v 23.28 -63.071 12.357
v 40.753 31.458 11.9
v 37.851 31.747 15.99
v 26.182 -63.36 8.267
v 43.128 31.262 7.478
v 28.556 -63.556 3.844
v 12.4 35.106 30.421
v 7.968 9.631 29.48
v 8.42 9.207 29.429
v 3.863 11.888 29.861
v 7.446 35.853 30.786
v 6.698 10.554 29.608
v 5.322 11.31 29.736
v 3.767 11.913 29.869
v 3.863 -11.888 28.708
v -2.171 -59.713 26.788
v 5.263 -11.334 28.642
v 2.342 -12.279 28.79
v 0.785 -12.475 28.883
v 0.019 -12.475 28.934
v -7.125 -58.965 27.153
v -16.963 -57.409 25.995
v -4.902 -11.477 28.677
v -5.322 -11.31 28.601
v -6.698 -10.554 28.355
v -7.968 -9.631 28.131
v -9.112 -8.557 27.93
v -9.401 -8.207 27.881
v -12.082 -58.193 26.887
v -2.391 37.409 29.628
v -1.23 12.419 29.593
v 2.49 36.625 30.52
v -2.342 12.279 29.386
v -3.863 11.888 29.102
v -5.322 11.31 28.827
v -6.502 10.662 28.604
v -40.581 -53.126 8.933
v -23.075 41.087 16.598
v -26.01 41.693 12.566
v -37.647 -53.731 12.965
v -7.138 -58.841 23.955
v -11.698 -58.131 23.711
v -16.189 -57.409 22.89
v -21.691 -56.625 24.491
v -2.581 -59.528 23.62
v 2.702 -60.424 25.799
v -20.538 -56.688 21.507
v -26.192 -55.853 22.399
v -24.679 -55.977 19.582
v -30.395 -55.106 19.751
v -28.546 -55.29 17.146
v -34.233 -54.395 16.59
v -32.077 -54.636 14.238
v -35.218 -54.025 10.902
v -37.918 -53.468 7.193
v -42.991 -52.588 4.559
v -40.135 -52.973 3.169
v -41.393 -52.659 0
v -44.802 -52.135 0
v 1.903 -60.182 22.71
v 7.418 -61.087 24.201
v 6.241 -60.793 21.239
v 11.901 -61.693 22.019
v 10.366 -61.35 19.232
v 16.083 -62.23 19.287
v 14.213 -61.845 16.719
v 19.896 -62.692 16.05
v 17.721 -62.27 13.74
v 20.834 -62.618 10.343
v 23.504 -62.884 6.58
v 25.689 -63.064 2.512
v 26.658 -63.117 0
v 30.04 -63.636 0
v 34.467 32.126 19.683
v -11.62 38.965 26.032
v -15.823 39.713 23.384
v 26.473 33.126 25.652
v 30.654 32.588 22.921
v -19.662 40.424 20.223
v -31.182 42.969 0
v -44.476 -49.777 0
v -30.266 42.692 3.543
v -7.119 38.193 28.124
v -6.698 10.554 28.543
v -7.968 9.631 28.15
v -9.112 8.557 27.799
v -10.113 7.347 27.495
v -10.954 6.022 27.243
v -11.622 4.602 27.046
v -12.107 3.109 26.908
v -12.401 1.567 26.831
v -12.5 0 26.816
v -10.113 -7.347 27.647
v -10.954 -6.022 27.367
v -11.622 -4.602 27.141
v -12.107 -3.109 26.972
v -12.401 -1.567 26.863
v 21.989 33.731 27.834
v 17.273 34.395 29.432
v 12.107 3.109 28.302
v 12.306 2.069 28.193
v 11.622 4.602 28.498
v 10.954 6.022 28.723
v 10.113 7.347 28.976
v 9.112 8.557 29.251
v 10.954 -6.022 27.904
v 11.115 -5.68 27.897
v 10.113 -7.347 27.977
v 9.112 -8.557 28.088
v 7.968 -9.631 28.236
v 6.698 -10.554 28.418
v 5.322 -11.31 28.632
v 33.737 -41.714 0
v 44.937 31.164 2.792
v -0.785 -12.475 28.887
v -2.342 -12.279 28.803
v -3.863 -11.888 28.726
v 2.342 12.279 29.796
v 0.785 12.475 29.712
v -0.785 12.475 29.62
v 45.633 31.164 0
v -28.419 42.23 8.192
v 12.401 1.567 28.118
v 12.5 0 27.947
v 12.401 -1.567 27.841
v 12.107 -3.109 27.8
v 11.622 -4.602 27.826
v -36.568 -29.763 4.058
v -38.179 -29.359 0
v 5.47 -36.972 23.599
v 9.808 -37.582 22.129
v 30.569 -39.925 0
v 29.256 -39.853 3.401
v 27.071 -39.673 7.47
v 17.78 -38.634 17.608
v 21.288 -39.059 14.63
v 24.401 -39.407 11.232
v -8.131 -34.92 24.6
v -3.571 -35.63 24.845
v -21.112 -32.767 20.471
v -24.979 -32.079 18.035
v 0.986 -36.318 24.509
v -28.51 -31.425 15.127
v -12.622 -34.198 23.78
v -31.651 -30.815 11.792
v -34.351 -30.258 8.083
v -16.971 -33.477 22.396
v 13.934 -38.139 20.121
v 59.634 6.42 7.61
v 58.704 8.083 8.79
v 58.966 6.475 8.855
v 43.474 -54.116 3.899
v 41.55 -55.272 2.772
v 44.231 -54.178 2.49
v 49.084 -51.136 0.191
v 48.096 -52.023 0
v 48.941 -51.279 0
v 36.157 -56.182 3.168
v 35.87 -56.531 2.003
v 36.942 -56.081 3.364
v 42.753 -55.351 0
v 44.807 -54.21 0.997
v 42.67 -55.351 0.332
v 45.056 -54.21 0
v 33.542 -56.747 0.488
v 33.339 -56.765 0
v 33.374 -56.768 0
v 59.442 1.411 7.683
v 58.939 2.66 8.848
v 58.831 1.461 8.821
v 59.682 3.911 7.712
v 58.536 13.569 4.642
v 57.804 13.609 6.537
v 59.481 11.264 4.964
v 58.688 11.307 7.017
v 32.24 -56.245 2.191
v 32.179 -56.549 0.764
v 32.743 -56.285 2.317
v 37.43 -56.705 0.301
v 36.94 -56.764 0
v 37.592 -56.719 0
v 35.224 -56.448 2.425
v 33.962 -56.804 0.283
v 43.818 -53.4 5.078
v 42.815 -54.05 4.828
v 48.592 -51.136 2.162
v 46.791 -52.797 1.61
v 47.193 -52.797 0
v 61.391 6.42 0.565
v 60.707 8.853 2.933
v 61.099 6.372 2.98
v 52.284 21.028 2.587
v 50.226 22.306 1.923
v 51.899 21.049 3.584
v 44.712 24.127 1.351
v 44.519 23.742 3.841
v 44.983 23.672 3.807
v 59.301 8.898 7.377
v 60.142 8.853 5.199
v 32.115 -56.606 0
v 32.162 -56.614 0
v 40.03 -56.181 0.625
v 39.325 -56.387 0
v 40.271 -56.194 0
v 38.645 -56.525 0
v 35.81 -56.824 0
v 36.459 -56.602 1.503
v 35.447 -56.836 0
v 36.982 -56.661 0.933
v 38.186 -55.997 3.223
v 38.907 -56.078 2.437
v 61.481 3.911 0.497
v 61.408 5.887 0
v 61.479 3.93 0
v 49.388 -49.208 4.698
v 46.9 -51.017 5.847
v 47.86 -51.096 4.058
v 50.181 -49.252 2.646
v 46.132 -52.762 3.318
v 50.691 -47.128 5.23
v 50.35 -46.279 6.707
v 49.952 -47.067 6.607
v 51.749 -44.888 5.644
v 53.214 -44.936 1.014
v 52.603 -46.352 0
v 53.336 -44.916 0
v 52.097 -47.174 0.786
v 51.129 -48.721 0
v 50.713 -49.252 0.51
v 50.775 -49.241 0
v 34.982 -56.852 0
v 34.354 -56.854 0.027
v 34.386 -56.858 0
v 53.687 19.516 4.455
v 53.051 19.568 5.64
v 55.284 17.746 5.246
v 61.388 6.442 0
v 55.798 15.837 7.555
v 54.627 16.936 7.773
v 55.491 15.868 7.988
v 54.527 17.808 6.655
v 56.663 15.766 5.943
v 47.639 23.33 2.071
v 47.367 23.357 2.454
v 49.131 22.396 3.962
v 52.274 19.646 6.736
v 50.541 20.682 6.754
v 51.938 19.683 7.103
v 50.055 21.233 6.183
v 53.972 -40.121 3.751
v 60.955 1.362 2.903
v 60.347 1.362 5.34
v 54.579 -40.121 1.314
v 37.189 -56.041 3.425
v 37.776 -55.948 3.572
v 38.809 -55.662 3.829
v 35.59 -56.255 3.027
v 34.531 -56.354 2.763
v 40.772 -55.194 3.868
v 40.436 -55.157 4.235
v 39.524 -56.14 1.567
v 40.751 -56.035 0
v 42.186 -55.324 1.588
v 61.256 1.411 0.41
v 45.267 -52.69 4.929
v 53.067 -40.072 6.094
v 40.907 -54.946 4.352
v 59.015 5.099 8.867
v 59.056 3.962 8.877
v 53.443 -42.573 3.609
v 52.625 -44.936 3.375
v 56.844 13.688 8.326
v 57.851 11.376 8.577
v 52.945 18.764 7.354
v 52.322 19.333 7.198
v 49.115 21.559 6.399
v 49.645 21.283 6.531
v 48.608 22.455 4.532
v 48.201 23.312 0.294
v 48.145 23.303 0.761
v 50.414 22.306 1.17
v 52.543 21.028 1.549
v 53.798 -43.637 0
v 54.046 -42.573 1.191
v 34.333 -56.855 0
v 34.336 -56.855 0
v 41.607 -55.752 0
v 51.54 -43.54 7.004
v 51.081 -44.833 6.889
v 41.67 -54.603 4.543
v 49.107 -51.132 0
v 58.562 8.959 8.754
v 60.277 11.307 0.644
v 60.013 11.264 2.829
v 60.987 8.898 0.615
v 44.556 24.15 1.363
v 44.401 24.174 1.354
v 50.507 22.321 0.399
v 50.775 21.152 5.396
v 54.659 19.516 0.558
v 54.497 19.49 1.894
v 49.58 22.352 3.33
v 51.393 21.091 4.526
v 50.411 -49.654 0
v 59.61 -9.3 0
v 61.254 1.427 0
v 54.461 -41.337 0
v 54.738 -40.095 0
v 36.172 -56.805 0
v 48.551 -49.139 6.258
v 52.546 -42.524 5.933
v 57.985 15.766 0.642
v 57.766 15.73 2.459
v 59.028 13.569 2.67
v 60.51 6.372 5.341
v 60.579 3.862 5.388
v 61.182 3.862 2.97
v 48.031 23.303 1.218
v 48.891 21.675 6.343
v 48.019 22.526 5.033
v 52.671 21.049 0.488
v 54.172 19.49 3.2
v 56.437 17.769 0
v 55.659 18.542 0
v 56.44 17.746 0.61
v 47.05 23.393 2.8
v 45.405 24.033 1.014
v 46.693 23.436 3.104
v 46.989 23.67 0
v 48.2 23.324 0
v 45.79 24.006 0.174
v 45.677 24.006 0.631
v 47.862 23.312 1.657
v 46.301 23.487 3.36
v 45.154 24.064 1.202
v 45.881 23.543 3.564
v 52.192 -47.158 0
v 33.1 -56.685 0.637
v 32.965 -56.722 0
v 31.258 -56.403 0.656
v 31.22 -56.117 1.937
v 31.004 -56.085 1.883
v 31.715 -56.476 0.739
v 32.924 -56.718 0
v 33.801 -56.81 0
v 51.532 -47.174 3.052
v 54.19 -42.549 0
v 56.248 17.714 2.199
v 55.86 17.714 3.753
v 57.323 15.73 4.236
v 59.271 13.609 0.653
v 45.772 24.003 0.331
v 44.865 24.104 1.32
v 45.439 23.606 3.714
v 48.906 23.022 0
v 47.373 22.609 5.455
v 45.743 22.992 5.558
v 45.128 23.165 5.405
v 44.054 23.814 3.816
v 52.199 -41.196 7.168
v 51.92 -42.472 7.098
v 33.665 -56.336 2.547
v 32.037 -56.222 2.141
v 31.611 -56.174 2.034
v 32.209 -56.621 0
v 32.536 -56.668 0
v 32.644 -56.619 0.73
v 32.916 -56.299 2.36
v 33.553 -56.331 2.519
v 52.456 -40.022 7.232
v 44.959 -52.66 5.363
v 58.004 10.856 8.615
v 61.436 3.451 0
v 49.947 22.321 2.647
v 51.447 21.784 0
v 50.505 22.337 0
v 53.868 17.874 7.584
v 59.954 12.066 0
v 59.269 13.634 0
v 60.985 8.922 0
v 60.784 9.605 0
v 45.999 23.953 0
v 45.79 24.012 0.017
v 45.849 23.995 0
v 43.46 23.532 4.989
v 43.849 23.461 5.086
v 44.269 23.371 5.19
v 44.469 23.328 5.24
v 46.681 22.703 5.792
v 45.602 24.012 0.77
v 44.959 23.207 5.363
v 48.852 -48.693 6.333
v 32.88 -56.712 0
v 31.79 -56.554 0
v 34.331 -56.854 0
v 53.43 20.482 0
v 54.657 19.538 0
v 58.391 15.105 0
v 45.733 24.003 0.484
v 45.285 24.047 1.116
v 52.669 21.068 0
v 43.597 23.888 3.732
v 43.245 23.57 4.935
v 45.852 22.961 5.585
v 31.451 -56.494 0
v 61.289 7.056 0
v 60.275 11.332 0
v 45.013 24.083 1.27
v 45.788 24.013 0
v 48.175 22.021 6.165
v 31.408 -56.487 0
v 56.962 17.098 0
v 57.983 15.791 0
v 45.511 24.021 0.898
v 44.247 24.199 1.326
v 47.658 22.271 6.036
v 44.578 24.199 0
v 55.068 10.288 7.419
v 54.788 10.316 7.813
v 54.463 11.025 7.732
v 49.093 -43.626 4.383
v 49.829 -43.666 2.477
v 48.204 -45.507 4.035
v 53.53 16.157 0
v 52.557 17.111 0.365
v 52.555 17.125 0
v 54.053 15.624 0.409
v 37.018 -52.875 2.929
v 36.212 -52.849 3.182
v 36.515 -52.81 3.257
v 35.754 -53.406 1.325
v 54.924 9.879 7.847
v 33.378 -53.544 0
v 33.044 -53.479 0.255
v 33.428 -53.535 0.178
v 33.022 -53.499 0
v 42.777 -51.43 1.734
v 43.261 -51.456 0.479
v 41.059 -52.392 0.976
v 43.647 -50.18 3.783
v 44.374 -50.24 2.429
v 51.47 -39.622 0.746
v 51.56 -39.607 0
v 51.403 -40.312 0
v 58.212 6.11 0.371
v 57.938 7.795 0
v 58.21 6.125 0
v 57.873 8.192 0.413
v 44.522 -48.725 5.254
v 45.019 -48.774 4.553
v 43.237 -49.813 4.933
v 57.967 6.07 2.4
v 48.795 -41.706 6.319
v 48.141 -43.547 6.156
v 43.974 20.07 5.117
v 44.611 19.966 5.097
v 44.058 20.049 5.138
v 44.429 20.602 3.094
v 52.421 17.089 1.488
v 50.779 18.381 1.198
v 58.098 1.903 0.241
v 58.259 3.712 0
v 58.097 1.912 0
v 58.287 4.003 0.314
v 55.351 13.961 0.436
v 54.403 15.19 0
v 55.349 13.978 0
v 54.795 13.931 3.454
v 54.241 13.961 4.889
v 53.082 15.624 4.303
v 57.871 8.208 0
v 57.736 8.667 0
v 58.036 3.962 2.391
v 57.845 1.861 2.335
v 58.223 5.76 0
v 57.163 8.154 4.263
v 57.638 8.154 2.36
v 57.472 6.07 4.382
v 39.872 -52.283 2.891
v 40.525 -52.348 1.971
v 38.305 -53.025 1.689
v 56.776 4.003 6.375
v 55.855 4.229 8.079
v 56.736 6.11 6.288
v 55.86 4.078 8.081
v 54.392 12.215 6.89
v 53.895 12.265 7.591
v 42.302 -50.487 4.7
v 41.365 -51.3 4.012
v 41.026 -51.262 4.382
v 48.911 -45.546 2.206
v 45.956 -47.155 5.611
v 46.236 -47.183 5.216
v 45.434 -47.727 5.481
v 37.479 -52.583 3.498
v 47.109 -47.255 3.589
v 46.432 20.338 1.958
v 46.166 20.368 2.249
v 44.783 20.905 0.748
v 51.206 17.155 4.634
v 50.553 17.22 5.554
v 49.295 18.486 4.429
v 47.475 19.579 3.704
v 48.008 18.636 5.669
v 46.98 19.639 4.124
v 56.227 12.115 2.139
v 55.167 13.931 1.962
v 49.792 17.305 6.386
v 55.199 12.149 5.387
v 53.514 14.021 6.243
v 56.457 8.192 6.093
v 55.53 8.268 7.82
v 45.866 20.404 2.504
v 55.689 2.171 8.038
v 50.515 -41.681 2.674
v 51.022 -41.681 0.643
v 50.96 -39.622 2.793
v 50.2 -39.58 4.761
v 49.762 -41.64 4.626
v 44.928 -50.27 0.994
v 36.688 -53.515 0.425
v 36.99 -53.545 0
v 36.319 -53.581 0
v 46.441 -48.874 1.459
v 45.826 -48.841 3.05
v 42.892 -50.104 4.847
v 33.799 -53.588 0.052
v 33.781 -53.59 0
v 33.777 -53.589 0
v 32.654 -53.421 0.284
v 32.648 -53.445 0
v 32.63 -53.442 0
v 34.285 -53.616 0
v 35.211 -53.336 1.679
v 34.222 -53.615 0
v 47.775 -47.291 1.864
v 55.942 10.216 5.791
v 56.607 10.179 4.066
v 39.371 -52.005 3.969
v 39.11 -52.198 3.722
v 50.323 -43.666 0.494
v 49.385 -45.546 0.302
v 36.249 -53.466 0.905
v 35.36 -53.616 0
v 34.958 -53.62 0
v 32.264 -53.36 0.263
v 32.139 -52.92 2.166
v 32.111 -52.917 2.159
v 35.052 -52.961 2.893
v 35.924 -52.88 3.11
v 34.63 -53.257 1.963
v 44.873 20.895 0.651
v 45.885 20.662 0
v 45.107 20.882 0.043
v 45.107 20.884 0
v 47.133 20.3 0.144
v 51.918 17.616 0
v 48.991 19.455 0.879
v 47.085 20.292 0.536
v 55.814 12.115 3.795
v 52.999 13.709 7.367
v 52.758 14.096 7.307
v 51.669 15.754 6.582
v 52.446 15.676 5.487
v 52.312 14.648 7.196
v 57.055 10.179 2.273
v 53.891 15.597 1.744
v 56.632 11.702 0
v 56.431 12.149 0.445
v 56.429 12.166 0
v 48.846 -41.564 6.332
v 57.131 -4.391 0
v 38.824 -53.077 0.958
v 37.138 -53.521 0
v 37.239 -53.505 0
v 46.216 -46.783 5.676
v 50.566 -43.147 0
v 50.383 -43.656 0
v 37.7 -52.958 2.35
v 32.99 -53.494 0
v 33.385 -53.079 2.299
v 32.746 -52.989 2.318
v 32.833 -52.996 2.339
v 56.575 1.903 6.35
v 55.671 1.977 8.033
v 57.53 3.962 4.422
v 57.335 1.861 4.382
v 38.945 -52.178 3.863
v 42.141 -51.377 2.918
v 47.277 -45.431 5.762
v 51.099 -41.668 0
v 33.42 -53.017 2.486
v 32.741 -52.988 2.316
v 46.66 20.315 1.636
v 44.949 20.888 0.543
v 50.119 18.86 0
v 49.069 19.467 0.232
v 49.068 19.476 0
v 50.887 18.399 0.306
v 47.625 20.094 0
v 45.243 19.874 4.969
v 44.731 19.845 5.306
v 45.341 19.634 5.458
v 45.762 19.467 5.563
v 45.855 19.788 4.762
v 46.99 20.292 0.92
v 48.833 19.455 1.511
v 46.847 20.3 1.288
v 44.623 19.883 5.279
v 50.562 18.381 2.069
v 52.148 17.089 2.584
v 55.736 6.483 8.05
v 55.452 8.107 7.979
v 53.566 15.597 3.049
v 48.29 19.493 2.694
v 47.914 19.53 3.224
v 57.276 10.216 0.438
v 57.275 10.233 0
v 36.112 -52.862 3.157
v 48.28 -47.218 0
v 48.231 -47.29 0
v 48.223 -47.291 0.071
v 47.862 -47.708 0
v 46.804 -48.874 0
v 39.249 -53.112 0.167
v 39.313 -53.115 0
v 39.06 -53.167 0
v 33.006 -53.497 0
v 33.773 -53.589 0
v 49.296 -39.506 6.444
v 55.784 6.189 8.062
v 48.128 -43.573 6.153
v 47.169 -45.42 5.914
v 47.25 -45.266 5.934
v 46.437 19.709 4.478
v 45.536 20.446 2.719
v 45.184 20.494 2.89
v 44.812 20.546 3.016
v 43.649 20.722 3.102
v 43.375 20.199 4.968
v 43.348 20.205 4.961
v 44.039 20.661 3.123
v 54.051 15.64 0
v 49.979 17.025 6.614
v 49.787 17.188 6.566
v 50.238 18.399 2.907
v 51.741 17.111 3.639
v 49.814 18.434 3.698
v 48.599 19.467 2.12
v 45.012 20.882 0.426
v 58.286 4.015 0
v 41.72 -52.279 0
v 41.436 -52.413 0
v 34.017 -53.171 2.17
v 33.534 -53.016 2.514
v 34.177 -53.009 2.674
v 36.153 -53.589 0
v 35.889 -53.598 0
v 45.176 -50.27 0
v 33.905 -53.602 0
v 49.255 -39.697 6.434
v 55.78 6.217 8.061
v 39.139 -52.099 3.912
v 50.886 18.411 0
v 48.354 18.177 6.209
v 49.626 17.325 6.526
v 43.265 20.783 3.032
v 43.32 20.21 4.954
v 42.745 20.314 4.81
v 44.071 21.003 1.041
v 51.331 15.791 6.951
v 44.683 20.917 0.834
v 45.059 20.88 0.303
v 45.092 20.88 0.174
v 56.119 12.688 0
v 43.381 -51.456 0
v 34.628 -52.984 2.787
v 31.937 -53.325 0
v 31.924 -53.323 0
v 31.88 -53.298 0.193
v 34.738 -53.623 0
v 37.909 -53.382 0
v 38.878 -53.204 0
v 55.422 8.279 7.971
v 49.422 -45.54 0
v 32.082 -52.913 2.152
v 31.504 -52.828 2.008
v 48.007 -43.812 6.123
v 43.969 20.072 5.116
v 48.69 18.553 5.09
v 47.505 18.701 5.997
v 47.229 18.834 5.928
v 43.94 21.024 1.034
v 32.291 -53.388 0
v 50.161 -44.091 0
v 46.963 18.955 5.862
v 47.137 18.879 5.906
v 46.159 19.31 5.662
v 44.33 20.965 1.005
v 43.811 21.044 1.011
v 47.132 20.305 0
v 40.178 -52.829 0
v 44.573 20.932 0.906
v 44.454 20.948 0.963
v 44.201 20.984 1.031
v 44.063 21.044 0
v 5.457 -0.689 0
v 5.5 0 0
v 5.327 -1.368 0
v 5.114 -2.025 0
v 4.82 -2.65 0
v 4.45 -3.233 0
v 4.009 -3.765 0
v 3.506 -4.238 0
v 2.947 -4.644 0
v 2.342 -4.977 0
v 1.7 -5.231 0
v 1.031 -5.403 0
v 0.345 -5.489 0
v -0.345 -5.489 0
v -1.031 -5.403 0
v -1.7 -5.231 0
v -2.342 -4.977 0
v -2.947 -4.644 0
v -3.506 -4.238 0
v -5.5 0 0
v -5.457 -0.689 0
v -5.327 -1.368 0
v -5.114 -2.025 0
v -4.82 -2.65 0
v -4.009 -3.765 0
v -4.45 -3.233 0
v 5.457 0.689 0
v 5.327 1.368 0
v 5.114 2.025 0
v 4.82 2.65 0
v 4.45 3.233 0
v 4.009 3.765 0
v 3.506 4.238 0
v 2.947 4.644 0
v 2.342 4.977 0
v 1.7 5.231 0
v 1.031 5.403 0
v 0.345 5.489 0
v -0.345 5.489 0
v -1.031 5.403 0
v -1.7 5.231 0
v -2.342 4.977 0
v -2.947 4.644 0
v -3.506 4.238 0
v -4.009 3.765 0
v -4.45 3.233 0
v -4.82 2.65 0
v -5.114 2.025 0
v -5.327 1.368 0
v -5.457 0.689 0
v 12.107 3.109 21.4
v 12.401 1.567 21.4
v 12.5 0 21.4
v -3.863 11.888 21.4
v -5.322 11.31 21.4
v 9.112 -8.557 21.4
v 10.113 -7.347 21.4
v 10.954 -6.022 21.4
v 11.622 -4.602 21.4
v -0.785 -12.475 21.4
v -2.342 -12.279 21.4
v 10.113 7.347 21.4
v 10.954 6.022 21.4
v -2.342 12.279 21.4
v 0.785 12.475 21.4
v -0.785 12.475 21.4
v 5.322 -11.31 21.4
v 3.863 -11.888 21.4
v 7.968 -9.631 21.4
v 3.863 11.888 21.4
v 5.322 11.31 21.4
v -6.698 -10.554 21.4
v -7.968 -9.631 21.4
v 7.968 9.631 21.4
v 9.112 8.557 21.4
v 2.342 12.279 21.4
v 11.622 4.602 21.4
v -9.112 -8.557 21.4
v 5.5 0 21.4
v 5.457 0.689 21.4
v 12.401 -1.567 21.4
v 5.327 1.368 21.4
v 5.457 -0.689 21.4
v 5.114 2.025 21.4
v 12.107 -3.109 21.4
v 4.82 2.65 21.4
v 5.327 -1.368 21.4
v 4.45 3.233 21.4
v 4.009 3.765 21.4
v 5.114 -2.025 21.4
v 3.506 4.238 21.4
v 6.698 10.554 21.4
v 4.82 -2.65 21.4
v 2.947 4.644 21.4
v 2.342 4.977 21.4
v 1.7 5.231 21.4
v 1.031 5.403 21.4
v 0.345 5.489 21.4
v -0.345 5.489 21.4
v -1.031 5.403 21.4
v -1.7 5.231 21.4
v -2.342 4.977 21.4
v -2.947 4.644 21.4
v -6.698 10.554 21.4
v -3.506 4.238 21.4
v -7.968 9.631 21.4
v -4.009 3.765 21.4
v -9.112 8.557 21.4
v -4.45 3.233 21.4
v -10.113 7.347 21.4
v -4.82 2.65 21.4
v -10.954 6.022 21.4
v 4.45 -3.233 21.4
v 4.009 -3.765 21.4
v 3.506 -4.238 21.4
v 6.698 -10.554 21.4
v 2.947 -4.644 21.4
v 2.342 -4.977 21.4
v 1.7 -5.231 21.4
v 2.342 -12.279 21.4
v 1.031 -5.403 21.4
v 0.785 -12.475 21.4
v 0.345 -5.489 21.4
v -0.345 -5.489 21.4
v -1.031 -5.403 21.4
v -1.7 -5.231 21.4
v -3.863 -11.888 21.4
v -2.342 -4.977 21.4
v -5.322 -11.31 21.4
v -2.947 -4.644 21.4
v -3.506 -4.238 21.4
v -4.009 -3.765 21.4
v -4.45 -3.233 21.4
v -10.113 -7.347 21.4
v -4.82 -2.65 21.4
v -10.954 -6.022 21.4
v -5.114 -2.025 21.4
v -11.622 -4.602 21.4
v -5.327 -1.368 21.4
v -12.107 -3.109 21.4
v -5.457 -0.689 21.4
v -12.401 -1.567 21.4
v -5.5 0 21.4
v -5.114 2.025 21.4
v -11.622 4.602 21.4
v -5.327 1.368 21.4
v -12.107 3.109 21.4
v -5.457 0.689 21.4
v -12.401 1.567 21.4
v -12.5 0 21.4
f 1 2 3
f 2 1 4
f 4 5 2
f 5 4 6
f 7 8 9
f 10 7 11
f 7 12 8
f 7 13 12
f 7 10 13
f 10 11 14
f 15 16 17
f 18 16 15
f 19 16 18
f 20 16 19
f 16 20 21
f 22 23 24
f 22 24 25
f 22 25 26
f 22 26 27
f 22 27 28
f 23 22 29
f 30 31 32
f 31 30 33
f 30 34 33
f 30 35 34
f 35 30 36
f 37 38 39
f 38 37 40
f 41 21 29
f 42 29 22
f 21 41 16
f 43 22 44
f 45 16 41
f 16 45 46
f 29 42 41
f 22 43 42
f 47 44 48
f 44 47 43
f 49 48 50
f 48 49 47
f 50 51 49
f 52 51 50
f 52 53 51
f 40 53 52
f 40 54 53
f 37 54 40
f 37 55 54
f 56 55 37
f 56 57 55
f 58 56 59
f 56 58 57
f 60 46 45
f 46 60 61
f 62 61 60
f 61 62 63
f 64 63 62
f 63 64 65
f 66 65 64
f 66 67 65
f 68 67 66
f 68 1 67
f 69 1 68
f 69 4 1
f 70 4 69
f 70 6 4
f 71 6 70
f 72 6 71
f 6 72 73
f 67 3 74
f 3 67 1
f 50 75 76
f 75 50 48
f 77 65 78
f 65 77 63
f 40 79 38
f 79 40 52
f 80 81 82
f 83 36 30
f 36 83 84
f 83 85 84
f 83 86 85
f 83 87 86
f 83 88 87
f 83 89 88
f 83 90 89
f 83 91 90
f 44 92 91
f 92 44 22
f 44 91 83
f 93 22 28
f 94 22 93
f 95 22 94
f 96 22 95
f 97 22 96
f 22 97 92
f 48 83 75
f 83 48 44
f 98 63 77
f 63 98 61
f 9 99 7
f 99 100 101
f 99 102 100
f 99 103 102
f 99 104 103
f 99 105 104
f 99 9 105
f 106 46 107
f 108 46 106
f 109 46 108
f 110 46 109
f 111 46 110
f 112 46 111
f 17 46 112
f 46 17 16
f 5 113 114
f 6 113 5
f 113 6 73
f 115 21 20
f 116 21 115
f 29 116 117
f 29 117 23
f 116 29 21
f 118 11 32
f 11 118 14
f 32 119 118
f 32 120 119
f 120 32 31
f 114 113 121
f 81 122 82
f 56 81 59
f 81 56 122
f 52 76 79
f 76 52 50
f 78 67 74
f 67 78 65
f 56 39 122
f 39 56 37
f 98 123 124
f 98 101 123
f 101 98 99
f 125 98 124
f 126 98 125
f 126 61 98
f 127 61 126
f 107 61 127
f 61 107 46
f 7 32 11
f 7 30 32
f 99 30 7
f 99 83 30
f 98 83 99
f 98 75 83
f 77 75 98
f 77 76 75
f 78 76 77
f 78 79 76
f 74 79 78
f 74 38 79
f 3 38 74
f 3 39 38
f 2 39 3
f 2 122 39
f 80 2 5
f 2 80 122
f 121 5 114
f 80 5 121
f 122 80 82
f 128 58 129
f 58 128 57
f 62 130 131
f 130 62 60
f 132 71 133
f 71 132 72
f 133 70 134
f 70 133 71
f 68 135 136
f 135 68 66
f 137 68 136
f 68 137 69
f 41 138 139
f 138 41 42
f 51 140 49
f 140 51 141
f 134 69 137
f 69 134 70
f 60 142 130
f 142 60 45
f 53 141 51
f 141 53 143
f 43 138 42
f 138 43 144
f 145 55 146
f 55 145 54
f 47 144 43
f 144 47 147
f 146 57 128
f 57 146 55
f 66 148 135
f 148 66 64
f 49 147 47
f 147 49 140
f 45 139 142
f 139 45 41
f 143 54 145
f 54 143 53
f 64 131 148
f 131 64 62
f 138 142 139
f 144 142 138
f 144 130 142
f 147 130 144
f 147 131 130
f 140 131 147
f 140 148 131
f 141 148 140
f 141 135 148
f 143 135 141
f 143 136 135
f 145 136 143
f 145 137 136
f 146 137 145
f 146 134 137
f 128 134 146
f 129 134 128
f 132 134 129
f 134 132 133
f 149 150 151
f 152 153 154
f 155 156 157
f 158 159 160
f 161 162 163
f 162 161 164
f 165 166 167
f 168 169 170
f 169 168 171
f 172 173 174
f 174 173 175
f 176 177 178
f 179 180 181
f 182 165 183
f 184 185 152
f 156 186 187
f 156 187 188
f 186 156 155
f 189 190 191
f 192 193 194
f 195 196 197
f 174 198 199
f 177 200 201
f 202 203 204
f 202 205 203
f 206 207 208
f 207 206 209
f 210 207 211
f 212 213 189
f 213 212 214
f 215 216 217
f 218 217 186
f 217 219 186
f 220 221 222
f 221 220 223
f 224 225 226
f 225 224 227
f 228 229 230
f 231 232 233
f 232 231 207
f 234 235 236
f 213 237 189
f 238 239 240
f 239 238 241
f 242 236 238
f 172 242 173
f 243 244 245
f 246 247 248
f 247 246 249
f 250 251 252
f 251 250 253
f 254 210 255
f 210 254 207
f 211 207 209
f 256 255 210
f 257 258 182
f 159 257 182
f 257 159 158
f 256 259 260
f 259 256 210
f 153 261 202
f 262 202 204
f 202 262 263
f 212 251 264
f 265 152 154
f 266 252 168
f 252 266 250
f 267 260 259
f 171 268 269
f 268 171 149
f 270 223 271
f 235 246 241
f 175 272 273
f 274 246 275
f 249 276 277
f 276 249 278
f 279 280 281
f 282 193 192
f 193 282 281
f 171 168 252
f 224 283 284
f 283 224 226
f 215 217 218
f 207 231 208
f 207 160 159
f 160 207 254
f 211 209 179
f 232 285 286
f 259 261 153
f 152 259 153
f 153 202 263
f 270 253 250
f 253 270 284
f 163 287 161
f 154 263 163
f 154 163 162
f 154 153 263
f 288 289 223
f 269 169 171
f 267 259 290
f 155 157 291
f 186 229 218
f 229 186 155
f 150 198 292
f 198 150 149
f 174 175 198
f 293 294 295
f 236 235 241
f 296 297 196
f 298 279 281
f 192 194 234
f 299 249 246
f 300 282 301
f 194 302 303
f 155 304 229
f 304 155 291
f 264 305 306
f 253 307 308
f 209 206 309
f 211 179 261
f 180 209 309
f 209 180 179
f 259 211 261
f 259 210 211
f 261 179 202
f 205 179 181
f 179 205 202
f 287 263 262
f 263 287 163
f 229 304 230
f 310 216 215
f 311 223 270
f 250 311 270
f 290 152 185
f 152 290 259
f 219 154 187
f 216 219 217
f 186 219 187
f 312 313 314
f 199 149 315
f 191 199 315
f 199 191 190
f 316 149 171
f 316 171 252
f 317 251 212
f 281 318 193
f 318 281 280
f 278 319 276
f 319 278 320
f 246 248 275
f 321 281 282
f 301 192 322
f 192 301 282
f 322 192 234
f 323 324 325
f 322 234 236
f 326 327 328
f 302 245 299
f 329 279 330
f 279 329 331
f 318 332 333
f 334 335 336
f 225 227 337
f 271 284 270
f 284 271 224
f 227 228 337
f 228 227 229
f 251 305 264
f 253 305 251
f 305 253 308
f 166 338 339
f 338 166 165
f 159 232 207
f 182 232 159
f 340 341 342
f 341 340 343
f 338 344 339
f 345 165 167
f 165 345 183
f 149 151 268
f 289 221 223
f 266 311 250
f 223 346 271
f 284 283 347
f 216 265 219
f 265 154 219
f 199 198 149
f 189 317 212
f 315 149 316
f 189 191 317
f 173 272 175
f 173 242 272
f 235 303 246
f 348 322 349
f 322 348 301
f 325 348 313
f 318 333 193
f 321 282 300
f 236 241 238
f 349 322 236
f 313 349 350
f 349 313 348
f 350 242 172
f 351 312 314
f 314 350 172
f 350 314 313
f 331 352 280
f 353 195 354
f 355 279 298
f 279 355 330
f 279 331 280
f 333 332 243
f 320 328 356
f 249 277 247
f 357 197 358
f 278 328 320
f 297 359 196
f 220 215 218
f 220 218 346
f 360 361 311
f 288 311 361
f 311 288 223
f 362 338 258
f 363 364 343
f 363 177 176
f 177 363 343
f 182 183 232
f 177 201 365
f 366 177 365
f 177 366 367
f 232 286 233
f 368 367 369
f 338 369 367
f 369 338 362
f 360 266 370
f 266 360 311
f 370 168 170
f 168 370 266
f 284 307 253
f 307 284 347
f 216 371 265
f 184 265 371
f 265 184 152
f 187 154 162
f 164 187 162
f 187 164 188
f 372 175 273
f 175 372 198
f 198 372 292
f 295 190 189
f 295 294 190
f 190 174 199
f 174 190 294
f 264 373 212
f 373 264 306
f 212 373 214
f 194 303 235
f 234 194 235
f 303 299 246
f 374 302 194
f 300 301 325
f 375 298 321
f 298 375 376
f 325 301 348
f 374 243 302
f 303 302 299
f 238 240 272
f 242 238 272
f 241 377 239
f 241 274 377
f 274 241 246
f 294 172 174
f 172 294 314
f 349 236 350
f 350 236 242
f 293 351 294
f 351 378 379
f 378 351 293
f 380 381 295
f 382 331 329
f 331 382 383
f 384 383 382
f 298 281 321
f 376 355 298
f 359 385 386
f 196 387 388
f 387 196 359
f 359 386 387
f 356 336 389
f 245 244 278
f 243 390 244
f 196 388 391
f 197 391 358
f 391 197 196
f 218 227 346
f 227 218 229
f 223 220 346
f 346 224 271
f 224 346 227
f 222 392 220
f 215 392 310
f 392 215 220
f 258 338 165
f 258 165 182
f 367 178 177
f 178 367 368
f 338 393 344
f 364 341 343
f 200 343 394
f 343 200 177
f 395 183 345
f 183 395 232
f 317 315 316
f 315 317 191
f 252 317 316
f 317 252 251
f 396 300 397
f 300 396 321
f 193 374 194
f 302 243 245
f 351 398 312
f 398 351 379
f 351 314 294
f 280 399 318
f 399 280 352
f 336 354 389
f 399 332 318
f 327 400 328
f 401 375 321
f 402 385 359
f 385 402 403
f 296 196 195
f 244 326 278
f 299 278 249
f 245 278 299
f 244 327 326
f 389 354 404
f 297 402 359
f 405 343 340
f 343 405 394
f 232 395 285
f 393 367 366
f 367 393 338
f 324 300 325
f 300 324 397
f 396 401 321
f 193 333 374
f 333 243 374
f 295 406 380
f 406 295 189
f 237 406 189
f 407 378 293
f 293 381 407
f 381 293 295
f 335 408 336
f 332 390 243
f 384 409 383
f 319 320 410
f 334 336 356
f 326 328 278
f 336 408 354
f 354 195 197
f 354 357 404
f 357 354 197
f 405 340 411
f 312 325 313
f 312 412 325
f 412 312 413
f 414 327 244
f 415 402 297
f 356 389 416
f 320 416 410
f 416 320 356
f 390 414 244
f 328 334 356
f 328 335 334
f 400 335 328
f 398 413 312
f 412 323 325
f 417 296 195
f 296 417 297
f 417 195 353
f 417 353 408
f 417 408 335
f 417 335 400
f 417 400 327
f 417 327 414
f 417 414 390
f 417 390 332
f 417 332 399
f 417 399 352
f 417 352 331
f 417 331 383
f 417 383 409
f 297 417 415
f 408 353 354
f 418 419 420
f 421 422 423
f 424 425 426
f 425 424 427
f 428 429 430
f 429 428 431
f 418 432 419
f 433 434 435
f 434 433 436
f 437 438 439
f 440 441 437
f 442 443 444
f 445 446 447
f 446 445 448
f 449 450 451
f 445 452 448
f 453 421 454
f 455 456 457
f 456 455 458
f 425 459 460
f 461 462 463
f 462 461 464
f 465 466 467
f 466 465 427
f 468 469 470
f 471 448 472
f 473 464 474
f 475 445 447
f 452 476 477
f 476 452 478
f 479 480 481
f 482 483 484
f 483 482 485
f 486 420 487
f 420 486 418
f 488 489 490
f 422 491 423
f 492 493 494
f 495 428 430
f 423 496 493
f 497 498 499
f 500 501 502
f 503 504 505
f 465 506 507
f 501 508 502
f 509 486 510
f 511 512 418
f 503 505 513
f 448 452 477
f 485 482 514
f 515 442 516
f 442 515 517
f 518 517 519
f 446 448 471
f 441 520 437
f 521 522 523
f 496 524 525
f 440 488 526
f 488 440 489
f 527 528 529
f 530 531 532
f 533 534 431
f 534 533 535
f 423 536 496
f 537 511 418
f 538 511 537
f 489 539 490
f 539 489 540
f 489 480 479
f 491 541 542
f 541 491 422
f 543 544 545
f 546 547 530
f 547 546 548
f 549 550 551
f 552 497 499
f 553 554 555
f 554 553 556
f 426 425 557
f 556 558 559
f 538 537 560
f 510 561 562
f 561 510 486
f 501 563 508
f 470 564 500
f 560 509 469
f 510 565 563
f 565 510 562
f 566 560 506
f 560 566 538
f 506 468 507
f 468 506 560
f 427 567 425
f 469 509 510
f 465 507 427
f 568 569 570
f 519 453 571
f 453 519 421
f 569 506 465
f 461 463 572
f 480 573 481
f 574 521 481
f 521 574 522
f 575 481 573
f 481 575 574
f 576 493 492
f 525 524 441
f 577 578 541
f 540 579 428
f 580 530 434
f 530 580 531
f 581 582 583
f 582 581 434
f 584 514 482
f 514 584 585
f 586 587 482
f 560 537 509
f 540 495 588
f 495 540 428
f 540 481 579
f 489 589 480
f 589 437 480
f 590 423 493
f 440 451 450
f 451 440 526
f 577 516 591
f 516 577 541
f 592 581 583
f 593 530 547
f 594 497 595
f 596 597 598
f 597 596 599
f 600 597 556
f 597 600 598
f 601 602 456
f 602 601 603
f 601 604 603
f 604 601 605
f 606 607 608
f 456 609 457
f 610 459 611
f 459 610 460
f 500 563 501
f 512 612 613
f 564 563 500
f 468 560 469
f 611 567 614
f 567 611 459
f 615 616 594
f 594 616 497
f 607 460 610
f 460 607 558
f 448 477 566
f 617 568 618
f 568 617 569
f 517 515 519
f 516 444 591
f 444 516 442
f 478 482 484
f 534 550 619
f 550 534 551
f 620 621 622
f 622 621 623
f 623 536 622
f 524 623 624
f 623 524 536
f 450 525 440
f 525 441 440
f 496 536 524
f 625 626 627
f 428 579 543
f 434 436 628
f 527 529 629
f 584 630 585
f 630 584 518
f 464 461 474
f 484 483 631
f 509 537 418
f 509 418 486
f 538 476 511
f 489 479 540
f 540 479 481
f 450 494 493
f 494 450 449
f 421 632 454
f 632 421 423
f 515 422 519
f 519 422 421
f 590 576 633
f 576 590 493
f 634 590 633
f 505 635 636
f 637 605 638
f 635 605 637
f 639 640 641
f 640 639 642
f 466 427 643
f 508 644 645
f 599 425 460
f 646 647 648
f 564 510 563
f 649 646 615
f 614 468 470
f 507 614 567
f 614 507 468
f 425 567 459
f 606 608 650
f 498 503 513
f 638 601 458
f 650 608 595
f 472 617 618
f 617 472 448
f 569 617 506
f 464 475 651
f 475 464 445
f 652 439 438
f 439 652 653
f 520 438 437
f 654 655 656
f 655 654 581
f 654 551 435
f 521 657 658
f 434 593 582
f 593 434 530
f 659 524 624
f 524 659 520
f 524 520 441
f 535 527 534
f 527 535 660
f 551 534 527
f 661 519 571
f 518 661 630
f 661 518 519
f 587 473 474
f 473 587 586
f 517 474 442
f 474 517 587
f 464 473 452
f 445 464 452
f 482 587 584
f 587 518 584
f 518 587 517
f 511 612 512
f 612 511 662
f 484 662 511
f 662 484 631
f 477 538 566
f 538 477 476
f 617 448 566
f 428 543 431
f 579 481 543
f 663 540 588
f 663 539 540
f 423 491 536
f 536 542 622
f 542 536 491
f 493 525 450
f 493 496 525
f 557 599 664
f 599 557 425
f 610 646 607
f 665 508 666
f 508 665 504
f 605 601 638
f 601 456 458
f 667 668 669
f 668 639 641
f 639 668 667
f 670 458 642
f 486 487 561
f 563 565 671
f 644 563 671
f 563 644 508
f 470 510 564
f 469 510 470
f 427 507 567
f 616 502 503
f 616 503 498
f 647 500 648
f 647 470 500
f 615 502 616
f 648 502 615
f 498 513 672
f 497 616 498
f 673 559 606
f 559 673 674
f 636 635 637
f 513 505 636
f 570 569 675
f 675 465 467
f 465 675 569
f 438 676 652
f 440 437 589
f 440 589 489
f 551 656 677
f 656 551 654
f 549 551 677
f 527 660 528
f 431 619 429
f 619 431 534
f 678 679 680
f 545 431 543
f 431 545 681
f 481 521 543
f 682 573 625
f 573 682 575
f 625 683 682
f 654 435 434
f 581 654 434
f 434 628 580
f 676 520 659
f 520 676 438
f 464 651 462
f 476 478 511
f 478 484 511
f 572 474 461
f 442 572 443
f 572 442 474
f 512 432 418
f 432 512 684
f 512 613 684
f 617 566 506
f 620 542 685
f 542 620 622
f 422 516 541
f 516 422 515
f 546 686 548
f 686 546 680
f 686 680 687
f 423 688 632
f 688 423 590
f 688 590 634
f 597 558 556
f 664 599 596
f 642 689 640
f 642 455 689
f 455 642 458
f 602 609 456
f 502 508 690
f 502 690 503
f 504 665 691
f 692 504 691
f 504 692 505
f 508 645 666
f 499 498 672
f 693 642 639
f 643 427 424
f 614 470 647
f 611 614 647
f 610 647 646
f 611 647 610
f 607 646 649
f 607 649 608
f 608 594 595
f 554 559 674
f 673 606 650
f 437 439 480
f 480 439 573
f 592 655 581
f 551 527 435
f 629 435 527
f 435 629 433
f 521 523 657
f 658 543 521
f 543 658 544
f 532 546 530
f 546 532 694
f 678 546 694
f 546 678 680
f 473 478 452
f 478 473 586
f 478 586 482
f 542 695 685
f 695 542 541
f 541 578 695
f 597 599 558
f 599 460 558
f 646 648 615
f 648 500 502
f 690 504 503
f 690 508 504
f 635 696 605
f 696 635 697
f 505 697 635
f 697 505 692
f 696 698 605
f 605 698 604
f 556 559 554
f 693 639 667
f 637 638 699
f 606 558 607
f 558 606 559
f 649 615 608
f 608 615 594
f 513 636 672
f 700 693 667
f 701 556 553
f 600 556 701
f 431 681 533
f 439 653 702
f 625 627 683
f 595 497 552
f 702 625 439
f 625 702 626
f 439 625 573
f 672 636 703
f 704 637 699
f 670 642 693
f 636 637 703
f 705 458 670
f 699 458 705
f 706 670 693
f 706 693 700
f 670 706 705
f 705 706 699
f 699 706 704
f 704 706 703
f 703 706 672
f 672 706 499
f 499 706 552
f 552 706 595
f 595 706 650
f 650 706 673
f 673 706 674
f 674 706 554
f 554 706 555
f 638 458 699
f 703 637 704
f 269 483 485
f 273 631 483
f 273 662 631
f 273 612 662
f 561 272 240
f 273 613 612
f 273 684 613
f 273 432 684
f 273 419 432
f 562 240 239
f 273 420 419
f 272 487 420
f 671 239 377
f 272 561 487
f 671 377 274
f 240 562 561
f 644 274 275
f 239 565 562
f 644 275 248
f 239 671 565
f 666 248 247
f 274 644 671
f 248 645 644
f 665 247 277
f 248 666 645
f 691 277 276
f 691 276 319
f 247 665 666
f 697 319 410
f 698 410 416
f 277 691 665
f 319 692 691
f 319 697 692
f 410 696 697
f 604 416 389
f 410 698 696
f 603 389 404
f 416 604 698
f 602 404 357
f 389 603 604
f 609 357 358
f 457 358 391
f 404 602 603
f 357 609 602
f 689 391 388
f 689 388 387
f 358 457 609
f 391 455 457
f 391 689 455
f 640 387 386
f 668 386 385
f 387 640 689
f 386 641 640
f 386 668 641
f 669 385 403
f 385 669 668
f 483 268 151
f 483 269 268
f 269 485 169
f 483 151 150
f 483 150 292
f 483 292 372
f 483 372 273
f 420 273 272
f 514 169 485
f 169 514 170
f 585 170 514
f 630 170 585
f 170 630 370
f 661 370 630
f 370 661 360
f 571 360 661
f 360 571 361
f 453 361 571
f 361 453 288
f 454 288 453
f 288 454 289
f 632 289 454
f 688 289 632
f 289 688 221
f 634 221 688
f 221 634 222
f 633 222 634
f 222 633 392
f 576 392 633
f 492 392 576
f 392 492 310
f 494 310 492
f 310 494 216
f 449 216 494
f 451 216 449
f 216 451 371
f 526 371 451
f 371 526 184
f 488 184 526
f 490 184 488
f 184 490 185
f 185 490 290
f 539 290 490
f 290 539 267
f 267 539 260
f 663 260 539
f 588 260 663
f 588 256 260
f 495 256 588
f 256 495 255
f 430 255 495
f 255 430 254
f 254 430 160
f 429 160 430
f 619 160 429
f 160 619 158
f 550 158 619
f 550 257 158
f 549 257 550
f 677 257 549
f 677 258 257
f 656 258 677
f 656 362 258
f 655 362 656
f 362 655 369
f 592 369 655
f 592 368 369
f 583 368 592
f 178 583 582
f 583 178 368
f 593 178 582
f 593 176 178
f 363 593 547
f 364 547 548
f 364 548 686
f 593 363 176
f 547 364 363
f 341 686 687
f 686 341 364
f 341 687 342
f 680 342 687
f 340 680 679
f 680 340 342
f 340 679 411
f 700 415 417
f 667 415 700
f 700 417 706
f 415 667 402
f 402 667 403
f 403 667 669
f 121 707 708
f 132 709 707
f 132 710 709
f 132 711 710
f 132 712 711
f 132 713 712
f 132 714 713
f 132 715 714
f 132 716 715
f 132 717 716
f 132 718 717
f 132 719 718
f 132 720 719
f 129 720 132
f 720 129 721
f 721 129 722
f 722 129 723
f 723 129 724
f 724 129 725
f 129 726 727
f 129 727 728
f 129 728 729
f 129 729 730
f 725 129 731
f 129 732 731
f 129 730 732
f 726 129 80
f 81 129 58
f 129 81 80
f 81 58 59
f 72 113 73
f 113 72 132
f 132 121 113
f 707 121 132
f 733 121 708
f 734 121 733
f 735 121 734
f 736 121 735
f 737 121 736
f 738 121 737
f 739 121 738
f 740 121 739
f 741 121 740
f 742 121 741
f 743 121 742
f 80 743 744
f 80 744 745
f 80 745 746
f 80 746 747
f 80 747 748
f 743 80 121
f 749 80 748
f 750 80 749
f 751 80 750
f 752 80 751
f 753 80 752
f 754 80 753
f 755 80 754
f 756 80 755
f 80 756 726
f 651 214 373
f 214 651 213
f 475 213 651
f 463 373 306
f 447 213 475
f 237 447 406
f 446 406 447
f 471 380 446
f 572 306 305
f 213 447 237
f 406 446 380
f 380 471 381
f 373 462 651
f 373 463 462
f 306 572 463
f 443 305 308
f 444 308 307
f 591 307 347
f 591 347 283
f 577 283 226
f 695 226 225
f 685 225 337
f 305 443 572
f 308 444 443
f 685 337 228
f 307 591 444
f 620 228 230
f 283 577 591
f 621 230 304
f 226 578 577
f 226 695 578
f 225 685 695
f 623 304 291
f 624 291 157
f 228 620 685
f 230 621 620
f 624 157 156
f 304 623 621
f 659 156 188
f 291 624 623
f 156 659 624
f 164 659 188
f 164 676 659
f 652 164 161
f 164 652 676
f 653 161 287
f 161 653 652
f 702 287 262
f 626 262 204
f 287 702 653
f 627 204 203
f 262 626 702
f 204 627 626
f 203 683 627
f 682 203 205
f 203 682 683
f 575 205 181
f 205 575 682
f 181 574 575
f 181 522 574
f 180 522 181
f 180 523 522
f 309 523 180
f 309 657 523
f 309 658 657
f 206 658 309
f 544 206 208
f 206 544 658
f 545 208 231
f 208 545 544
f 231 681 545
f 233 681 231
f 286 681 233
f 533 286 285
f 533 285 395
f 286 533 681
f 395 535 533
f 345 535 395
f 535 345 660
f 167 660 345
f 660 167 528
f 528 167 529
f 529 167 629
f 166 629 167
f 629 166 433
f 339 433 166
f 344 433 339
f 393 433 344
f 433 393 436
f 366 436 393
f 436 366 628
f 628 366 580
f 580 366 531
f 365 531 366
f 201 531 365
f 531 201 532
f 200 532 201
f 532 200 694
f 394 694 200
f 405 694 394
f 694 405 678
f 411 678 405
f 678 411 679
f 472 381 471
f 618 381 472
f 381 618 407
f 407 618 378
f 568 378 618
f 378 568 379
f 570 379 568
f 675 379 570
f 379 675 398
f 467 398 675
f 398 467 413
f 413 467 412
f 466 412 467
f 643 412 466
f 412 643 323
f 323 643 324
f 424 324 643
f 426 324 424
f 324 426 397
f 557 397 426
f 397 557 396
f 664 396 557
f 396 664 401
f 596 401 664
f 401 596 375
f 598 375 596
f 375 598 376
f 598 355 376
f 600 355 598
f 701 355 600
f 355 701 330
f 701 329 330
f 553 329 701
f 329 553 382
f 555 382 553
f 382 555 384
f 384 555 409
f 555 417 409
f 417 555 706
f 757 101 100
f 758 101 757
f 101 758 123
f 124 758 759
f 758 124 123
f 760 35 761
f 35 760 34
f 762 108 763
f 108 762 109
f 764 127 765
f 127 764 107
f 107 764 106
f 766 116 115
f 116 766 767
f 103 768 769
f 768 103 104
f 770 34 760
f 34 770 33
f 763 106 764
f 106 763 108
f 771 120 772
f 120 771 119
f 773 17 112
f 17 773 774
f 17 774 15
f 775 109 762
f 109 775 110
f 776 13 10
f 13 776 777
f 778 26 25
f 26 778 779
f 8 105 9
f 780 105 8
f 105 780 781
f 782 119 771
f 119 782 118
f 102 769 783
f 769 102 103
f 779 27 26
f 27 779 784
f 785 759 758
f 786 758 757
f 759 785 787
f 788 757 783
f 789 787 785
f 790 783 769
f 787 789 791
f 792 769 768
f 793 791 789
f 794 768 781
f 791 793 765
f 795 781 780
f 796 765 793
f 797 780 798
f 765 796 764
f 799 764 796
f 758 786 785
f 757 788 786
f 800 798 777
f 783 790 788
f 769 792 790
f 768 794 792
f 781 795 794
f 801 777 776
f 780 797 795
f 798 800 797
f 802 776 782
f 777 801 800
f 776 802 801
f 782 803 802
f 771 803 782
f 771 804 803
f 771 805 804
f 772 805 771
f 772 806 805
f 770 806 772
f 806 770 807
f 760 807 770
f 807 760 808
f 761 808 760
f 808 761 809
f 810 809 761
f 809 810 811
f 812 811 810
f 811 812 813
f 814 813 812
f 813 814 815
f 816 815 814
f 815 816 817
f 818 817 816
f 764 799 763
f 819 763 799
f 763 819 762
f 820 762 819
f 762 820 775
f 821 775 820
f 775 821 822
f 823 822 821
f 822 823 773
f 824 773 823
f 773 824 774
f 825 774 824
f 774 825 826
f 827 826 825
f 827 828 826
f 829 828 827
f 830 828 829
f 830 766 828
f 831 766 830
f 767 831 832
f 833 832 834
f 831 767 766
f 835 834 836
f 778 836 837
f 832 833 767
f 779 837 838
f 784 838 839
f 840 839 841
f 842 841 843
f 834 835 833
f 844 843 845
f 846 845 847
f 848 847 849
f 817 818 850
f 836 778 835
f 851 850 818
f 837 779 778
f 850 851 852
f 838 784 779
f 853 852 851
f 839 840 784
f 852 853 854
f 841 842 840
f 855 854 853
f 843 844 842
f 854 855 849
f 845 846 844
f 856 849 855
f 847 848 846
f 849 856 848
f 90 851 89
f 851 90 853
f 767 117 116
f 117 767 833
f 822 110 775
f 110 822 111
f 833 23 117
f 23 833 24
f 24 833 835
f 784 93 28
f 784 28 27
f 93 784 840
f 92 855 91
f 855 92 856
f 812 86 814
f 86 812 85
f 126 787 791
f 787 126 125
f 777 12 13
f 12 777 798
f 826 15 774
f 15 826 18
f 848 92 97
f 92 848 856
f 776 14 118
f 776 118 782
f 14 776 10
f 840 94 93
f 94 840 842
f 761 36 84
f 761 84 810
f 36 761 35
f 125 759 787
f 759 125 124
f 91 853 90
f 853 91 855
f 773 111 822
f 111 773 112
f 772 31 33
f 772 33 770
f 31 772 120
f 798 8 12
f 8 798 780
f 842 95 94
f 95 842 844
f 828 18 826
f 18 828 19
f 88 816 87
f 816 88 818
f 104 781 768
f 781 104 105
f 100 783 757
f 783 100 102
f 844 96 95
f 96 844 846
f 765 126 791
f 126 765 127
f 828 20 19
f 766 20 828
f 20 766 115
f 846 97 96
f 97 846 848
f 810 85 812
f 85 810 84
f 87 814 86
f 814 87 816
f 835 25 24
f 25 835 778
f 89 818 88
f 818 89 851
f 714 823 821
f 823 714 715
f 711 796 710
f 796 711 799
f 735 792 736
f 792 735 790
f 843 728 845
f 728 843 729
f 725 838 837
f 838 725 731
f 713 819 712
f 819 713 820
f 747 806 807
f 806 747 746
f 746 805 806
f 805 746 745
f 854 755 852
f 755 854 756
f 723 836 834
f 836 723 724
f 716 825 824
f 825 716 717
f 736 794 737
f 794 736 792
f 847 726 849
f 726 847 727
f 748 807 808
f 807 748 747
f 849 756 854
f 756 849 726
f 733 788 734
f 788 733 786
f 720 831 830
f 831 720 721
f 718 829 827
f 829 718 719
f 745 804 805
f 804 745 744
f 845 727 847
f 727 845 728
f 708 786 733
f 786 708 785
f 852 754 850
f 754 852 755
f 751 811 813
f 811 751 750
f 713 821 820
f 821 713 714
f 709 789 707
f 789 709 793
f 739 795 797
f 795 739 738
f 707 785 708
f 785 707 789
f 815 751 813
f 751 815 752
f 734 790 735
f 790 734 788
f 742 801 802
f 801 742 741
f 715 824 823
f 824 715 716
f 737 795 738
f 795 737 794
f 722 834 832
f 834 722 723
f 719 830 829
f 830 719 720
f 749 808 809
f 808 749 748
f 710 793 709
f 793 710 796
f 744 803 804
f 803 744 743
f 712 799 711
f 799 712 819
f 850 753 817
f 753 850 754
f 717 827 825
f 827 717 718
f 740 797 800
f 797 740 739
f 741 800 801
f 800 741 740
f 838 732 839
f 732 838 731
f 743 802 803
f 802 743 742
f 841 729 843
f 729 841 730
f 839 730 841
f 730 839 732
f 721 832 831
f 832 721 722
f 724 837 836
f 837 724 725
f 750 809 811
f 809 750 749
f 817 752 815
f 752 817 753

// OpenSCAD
//Customizer assignment, dlbrinks
//Some code used from "Bolt for MTU-777 Rock Wall Assignment", see https://www.thingiverse.com/thing:481050
//Licensed under the Creative Commons - Attribution - Share Alike license

//Bolt head diamter with clearance for tool
B=25;

// Bolt head height
h=9;
//[5:50]

// Bolt overall length
l=69.5;
//[65:0.5:100]

// Bolt diameter
d=11;
//[10,11,12,13,14,15]

$fn=50;

// How tall should the cup be?
cuphieght=96;
//[50:500]                    

// What should the cup radius be?                    
cupradius=40;
//[10:250]

//Bolt inlay - use to align bolt hole with model after rotation:
boltinlay = -48;
//[-60:0]

//Upper handle radius
    topr=20;
    //[15:50]
    
    //Bottom handle radius
    bottomr=20;
    //[15:50]
    
        //How tall would you like your handle?
    handlehieght=42;
    //[30:400]
    
    //Handle "Z" adjust - modify handle height:
    handlezadj=9;
    //[0:50]

module bolt(){
union(){
		translate([0,0,l-0.1])cylinder(h=h, r=B/2); //space for head
		cylinder(h=l, r=d/2); // bolt shaft
		}
					}



                    
module cup(){
//cuphieght=96;
//cupradius=40;
wall=3.2;
    
    
    //subtract a smaller cylinder from a larger one, form cup
    //fill the inside with translate +z to make strong climb hold
difference(){cylinder(h=cuphieght,r=cupradius,center = true);
    translate([0,0,cuphieght-25])cylinder(h=cuphieght-3,r=cupradius-wall, center = true);
    }
translate([0,cupradius,cuphieght/8])handle();
}


difference(){
difference(){
translate([0,-10,-11])rotate([99,76,0])cup();
    translate([-150,-150,-300])cube([300,300,300], center=false);
}
translate([0,0,boltinlay])bolt();
}
//handle
module handle(){
    //params
    
    
    
    offset=0;
    handlewidth=3.2;

    
    //Slice out a section of 2 spheres, hulled together
    intersection(){
        difference(){
        translate([0,0,handlezadj])hull(){
            sphere(r=topr);
            translate([offset,0,-1*(handlehieght)])sphere(r=bottomr);
        };
        translate([0,0,handlezadj])hull(){
            sphere(r=topr-handlewidth);
            translate([offset,0,-1*(handlehieght)])sphere(r=bottomr-handlewidth);
        };
    }
translate([0,topr/2,-1*(topr-2.5)])cube(size = [10, topr, handlehieght*3], center = true);
}
}
